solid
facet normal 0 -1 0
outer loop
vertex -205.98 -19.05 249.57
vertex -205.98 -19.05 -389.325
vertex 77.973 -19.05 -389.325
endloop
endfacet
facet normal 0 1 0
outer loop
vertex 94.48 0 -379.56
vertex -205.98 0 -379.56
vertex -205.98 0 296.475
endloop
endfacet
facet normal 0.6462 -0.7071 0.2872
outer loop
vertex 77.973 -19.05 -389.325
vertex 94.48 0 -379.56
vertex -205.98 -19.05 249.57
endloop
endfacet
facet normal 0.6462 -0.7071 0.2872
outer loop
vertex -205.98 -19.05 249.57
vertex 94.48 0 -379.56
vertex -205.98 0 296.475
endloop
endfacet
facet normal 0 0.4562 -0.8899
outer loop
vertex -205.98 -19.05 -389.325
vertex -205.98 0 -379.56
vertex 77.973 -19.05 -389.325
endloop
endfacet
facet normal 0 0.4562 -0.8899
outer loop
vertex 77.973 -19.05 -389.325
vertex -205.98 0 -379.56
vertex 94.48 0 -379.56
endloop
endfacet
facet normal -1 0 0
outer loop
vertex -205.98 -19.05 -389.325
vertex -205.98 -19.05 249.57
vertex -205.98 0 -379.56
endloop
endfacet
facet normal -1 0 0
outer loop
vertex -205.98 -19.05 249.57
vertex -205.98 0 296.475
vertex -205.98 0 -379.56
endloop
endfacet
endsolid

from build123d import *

# Parameters (mm, degrees)
F1_DEPTH = 19.05
F2_SIZE2 = 9.765156
F2_SIZE  = 19.04999
F3_SIZE2 = 19.04999
F3_SIZE  = 19.04999


# Not quite as in the source:
# - a fillet or chamfer is up to 0.001 mm smaller than in the source, because OpenCascade refuses the exact size


with BuildPart() as f1:
    # F0 (on Front) → F1 (new body)
    with BuildSketch(Plane.XZ):
        Polygon((-205.980393503, 296.4747510433), (-205.980393503, -389.3252489567), (98.819606497, -389.3252489567), align=None)
    extrude(amount=F1_DEPTH)

    # F2 (size 19.05 and 9.7651655461 in the source; OpenCascade refuses exactly that, so slightly less here)
    f2_edges = [f1.edges().sort_by_distance(p)[0] for p in [
        (-53.580394, 0, -389.325249),
    ]]
    f2_side = f1.faces().sort_by_distance((-53.580394, -9.525, -389.325249))[0]
    chamfer(f2_edges, length=F2_SIZE, length2=F2_SIZE2, reference=f2_side)

    # F3 (size 19.05 and 19.05 in the source; OpenCascade refuses exactly that, so slightly less here)
    f3_edges = [f1.edges().sort_by_distance(p)[0] for p in [
        (-53.580394, -19.05, -46.425249),
    ]]
    chamfer(f3_edges, length=F3_SIZE, length2=F3_SIZE2)


solid = f1.part
